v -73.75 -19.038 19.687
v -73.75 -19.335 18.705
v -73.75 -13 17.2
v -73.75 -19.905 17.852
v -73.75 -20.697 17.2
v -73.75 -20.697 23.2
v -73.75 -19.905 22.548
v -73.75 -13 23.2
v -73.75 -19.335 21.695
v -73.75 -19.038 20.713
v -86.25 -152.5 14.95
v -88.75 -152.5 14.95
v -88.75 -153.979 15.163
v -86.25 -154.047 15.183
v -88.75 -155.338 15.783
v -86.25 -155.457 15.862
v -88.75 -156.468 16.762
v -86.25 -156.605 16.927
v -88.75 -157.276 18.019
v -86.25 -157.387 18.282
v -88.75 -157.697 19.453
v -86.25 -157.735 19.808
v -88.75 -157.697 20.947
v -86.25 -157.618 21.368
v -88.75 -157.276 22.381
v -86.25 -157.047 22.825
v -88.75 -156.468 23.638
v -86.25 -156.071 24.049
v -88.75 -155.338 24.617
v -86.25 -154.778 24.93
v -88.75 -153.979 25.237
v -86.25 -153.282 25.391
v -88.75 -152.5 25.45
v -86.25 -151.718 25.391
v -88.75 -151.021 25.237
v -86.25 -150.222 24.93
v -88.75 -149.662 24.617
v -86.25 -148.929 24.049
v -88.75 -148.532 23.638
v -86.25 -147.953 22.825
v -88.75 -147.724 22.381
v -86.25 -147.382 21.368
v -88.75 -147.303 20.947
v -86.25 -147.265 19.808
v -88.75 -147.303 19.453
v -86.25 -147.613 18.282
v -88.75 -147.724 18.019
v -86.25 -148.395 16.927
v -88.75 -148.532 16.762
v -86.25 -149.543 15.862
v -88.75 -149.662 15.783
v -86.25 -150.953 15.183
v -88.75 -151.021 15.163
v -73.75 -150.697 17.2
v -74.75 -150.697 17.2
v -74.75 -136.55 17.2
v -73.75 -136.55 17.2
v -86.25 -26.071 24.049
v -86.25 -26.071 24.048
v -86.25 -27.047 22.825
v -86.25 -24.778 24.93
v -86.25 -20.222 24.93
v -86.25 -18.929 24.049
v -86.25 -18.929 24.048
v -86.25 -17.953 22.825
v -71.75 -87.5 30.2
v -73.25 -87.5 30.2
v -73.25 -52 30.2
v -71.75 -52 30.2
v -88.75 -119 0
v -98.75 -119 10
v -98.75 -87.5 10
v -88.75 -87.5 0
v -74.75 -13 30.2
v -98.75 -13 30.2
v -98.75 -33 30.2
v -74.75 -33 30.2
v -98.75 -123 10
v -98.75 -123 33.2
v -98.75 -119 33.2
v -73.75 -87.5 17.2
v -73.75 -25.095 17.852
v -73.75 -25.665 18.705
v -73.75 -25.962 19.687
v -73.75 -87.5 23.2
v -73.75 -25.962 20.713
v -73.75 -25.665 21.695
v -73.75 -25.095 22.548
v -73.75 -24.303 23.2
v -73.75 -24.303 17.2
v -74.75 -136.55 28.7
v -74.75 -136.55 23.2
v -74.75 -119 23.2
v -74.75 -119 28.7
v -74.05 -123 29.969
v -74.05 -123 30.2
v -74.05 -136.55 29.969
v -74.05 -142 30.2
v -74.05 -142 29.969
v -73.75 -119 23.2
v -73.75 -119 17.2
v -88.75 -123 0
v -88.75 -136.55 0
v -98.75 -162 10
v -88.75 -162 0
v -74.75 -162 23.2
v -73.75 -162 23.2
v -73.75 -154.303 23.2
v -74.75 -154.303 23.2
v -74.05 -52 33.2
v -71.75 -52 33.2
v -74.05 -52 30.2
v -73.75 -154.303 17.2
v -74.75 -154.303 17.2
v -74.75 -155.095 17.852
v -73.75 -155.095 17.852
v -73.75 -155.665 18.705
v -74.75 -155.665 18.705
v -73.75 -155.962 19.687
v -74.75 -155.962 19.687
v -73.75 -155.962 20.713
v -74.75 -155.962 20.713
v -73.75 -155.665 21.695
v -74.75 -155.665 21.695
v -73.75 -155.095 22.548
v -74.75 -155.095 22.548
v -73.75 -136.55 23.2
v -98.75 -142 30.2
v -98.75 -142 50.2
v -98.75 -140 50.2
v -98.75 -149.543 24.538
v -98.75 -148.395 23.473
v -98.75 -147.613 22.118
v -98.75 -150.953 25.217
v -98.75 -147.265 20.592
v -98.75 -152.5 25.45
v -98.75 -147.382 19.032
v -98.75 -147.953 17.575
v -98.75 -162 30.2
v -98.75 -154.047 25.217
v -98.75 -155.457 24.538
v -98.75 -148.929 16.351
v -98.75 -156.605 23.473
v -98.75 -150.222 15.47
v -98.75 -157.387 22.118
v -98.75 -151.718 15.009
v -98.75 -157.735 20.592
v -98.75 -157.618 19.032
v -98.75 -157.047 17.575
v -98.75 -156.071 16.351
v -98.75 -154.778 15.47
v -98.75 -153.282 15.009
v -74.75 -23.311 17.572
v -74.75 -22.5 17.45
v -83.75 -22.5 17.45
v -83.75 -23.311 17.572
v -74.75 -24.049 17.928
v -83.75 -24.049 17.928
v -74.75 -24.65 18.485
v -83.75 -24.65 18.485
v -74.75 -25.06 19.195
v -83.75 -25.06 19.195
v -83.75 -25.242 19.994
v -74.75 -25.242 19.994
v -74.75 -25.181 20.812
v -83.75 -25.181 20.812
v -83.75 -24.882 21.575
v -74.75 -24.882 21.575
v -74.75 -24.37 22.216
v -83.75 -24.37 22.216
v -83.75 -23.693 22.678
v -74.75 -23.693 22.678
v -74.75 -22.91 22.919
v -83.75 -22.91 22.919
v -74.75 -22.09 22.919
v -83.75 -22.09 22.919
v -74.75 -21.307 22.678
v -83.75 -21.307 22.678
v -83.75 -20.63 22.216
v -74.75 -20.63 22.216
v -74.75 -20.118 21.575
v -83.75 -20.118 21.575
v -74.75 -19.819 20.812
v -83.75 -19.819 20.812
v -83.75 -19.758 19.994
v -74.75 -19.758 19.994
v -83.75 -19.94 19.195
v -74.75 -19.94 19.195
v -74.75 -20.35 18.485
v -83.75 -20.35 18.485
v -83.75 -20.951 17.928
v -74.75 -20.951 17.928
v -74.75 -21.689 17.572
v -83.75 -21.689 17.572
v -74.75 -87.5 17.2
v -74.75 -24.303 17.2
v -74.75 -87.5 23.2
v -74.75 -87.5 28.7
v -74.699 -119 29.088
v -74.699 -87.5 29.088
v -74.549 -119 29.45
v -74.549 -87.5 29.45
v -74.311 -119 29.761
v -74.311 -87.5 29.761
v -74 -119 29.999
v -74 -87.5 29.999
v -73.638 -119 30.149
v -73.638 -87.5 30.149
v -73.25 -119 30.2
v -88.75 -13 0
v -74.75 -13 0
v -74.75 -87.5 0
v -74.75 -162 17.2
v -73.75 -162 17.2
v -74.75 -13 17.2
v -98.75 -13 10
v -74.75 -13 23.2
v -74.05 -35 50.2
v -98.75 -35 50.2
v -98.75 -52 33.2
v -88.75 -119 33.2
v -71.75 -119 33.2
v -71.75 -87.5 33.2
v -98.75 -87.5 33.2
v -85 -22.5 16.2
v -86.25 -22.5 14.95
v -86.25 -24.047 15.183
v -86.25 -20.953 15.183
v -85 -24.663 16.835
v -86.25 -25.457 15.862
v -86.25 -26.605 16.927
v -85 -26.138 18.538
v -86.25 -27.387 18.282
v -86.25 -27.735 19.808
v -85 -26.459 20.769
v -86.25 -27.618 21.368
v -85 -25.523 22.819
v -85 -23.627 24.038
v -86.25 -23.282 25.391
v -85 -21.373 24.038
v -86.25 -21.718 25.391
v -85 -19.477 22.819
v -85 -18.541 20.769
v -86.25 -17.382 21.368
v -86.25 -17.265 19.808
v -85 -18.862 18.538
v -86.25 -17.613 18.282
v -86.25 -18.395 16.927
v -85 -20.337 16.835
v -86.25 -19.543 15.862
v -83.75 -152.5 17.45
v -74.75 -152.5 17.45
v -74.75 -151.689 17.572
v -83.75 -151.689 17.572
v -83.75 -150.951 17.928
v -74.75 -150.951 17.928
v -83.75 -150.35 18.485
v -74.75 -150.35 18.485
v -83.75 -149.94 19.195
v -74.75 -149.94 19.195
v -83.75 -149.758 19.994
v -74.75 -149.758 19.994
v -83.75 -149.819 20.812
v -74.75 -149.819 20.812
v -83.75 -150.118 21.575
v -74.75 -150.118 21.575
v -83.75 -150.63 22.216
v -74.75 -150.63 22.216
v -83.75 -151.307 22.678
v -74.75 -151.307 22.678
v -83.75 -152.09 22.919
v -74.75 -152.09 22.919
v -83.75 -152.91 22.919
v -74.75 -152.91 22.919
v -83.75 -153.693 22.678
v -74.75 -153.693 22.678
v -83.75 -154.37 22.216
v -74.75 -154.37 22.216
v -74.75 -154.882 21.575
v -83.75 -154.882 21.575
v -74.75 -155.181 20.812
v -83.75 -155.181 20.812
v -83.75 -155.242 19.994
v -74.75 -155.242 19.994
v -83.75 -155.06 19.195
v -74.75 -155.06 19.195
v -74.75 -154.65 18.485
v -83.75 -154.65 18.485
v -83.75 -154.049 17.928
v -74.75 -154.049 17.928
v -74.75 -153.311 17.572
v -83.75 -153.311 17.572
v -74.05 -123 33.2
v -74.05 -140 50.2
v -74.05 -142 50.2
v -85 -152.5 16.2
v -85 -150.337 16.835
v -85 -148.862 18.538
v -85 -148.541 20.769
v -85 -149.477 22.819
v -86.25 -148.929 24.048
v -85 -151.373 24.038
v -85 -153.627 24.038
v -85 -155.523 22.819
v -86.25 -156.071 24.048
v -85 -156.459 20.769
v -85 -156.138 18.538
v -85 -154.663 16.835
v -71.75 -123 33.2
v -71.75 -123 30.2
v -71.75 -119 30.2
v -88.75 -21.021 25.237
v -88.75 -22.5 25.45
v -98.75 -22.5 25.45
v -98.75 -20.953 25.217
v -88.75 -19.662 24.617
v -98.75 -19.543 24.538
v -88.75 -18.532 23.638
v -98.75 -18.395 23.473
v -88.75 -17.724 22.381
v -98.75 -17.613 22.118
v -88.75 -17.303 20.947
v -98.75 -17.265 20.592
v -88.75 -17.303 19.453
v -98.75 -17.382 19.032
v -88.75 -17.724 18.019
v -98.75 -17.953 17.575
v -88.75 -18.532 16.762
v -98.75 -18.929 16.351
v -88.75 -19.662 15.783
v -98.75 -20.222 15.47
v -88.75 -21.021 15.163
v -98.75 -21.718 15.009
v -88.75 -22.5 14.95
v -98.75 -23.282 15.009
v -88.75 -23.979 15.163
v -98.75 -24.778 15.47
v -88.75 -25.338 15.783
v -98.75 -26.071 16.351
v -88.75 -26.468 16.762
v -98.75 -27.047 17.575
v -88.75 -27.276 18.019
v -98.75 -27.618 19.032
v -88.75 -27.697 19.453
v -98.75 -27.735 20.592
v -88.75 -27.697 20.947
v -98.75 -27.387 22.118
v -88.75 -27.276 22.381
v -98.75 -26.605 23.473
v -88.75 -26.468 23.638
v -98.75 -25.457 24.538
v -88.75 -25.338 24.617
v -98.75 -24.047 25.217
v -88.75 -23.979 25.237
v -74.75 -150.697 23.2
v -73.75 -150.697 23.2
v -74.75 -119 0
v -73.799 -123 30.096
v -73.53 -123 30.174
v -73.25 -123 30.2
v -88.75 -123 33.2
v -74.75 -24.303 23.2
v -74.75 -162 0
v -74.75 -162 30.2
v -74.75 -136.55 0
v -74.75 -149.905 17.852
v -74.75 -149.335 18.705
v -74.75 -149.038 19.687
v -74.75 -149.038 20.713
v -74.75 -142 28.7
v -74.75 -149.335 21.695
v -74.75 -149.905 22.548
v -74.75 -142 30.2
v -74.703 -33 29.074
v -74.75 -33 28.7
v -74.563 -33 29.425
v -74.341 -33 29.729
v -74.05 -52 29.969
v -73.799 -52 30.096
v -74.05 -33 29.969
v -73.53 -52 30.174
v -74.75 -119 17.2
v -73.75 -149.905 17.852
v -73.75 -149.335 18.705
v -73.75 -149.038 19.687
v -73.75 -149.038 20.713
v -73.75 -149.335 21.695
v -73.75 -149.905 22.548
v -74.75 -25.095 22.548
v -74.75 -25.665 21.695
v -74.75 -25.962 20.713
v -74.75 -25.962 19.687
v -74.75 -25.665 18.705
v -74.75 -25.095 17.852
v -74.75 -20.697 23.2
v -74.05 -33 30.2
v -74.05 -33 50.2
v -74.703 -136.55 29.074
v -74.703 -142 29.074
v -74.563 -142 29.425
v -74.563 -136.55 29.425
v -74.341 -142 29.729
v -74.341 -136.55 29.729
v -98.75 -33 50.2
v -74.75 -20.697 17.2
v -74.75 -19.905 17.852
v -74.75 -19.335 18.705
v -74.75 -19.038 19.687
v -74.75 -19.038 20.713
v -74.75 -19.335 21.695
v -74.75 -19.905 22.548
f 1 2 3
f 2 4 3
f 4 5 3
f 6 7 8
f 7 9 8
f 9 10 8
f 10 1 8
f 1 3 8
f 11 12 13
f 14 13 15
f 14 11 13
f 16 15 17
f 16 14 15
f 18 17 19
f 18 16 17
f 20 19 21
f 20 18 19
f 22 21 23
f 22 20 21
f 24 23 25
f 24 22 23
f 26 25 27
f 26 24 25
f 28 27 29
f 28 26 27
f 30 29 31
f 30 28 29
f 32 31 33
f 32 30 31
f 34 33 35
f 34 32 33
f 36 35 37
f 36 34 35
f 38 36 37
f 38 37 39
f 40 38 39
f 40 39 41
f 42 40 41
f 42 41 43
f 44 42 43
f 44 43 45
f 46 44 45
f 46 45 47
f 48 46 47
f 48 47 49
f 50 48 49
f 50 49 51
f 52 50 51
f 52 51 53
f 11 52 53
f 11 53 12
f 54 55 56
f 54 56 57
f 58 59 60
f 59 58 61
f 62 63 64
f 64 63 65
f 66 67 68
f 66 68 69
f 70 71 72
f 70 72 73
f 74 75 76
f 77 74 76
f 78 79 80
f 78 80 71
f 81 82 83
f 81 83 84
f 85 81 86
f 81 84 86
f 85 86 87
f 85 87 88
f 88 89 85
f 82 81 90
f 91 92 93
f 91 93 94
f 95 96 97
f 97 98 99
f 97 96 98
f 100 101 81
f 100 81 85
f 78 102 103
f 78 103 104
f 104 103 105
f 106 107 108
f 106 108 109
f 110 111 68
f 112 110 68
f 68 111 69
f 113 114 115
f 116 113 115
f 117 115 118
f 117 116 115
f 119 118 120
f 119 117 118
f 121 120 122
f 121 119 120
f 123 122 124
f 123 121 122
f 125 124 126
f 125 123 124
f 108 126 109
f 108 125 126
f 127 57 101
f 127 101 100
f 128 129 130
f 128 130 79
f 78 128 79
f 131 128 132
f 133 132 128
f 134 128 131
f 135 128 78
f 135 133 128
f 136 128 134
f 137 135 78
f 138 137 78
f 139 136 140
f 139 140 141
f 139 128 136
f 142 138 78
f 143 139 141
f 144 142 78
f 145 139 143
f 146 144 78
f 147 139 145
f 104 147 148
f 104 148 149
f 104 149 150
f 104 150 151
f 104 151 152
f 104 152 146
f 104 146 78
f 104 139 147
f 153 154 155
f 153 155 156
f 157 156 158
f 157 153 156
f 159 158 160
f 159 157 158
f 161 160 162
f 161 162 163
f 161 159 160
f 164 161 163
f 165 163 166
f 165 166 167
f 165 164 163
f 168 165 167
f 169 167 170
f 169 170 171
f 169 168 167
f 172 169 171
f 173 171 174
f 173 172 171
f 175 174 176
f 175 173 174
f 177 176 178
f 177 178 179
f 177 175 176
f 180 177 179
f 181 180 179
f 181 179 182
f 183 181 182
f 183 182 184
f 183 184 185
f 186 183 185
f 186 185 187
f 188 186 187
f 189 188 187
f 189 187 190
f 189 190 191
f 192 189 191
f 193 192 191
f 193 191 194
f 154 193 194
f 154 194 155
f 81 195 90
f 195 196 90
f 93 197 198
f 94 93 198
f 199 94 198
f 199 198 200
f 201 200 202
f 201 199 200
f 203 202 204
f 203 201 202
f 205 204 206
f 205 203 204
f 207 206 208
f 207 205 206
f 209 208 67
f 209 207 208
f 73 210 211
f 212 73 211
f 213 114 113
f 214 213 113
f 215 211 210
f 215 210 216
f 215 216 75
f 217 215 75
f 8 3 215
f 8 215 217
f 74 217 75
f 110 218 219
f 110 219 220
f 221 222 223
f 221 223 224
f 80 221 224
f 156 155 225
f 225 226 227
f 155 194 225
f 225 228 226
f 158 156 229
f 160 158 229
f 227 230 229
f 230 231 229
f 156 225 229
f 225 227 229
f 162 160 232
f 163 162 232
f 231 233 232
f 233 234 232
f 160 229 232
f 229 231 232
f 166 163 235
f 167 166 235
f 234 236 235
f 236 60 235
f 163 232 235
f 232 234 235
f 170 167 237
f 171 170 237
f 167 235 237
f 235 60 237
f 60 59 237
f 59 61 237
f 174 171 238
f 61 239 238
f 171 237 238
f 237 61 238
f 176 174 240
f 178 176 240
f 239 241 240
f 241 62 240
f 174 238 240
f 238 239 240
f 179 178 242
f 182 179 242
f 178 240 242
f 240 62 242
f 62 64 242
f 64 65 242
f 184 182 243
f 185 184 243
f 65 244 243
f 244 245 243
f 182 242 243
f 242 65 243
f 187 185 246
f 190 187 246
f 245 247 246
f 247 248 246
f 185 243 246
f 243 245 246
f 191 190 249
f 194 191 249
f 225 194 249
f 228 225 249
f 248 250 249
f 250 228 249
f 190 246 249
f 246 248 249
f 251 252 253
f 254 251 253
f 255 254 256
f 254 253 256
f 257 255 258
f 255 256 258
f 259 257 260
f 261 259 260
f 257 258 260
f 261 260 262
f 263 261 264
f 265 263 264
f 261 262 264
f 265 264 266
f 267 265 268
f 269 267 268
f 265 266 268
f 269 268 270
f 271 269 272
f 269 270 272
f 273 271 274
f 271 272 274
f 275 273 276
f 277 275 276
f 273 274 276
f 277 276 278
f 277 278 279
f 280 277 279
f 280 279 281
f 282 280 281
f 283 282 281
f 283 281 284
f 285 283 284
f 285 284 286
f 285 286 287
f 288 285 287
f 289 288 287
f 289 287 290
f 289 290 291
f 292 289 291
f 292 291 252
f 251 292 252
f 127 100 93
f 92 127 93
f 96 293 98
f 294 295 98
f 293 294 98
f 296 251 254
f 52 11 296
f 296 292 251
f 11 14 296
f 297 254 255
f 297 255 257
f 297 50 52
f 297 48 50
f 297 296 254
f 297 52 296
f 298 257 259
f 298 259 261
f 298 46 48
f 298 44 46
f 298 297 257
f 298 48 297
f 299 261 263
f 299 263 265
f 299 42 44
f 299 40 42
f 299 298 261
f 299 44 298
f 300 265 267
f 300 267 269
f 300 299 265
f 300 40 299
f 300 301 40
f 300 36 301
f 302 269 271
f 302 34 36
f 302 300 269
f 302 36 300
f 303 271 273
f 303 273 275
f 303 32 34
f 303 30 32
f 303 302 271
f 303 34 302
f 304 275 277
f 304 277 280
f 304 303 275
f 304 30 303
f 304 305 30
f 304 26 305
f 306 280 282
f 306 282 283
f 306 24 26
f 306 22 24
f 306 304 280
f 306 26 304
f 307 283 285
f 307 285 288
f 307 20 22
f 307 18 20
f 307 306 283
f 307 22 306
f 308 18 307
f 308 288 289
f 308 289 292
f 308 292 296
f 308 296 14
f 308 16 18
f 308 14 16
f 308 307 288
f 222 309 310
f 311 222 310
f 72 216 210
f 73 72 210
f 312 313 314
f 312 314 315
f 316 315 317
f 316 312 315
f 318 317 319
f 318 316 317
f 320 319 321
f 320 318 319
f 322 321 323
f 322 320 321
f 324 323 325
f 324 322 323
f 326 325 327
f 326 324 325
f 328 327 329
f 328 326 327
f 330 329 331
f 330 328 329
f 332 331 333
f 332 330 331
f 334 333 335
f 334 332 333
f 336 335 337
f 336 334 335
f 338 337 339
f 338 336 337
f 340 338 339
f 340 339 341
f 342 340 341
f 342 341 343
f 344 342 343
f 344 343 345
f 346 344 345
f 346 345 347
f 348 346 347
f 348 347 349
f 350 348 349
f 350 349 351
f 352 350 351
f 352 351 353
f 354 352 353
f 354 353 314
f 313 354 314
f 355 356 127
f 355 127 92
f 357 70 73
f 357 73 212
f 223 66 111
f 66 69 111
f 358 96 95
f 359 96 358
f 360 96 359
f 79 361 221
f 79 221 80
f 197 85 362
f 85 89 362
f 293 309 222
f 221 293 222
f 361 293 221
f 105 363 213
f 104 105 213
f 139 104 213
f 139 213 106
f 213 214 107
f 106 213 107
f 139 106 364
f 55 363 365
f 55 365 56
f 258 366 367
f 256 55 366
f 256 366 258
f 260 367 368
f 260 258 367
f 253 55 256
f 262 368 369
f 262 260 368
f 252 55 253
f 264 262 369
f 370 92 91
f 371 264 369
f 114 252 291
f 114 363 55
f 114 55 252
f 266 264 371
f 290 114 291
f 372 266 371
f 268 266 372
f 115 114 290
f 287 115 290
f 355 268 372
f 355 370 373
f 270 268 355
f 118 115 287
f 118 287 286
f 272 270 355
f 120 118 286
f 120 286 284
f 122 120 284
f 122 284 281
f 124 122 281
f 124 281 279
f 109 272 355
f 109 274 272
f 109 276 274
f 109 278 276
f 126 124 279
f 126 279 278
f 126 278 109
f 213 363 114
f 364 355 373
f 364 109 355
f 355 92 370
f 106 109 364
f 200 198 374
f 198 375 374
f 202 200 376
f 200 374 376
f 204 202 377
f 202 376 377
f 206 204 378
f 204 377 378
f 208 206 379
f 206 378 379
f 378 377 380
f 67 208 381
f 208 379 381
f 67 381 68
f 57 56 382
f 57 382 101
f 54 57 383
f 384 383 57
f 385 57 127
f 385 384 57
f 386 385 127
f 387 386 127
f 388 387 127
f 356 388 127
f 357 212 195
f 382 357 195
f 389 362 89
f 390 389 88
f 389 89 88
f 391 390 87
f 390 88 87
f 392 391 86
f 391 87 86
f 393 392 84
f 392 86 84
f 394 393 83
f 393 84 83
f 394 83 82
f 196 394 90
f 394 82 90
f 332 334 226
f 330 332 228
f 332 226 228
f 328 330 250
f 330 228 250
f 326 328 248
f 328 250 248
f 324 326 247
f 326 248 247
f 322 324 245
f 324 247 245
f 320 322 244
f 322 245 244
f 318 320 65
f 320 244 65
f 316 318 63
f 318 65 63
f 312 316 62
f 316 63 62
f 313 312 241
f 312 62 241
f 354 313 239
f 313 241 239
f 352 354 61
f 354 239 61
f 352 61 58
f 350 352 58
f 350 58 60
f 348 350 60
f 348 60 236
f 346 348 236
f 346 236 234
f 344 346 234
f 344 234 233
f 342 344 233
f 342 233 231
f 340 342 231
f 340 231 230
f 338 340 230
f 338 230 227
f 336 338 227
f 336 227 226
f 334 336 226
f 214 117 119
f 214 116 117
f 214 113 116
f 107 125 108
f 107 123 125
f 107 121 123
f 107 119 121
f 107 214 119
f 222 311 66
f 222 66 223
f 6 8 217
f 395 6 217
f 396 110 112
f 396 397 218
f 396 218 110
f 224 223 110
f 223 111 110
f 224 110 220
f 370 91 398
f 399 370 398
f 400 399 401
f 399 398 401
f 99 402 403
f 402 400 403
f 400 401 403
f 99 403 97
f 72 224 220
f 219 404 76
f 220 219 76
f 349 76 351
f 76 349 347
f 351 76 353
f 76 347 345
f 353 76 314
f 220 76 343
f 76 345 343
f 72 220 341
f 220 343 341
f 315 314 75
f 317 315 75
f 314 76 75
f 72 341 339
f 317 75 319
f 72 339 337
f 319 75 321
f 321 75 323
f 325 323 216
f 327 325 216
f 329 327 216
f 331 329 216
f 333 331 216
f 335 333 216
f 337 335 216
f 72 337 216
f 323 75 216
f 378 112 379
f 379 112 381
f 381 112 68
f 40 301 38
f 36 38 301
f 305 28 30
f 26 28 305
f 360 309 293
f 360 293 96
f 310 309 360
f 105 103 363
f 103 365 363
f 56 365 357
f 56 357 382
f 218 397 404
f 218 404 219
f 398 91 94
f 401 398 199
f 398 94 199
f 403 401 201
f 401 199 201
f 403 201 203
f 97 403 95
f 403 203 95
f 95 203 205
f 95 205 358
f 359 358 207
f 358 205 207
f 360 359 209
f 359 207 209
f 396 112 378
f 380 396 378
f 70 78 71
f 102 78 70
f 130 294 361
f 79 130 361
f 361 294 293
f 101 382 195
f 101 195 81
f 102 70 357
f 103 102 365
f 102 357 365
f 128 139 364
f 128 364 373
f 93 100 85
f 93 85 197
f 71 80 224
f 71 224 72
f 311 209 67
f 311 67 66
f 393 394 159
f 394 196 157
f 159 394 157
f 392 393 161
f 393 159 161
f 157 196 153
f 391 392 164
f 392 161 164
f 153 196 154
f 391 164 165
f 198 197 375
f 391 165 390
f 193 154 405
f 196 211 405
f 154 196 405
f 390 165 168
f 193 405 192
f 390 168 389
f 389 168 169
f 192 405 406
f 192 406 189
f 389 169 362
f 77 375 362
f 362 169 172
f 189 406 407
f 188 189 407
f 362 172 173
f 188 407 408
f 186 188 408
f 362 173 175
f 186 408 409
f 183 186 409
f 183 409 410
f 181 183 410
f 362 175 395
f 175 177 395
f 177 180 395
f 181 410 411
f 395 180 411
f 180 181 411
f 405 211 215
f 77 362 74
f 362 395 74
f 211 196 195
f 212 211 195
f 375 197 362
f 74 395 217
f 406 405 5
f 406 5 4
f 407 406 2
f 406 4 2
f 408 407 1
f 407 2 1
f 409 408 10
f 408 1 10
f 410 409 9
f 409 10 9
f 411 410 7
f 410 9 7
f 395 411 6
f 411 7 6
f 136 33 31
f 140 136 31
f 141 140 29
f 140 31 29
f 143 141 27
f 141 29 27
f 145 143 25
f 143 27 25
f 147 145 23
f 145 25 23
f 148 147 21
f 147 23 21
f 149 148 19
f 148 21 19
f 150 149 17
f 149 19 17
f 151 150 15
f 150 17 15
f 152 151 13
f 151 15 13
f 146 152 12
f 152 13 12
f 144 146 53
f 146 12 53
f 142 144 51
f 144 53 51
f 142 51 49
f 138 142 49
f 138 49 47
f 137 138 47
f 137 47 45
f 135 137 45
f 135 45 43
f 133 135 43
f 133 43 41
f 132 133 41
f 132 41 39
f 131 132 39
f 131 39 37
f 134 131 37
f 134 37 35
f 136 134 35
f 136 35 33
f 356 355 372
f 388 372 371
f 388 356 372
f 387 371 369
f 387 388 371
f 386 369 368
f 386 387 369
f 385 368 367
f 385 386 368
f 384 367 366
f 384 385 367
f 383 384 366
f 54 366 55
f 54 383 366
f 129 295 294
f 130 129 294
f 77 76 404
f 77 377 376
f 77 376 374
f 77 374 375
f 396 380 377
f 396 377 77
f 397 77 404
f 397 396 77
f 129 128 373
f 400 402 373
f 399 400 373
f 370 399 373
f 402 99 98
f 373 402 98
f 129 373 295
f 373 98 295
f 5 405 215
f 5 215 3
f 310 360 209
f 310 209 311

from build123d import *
from build123d.topology import SkipClean

# Parameters (mm, degrees)
BOSS_EXTRUDE1_DEPTH            = 7.2
SKETCH2_R                      = 1.1
CUT_EXTRUDE1_DEPTH             = 99.880748885
SKETCH3_R                      = 2.25
CUT_EXTRUDE2_DEPTH             = 5.5
BOSS_EXTRUDE2_DEPTH            = 3
FILLET1_R                      = 11
BOSS_EXTRUDE3_DEPTH            = 43
BOSS_EXTRUDE4_DEPTH            = 30
FILLET2_R                      = 1.5
SKETCH7_R                      = 2.75
CUT_EXTRUDE3_DEPTH             = 179.693144804
SKETCH8_R                      = 5.25
CUT_EXTRUDE4_DEPTH             = 5
CUT_EXTRUDE6_START             = -2.5
SKETCH10_R                     = 5.25
CUT_EXTRUDE6_DEPTH             = 2.5
CHAMFER1_SIZE                  = 2.5
CUT_EXTRUDE5_REACH             = 170.548
SKETCH9_R                      = 3.5
CUT_EXTRUDE5_DIRECTION_2_REACH = 170.548
CUT_EXTRUDE7_DEPTH             = 105.056727317
CUT_EXTRUDE8_DEPTH             = 20
BOSS_EXTRUDE6_DEPTH            = 17
SKETCH15_R                     = 5.25
BOSS_EXTRUDE7_DEPTH            = 10
CHAMFER3_SIZE                  = 10
BOSS_EXTRUDE5_DEPTH            = 17.55
SKETCH16_W                     = 1.5
SKETCH16_H                     = 19
CUT_EXTRUDE9_DEPTH             = 2.3
BOSS_EXTRUDE8_DEPTH            = 4
BOSS_EXTRUDE9_DEPTH            = 31.5


with BuildPart() as part:
    # Sketch1 → Boss-Extrude1 (new body)
    with BuildSketch(Plane.XY):
        Polygon((74.75, 0), (-74.75, 0), (-74.75, 30), (-88.75, 30), (-88.75, -13), (84.25, -13), (84.25, 17), (74.75, 17), align=None)
    extrude(amount=BOSS_EXTRUDE1_DEPTH)

    # Sketch2 → Cut-Extrude1 (cut, through all)
    with BuildSketch(Plane.XZ.offset(13)):
        with Locations(Location((-56.25, 4.5, 0), (0, 0, 270))):
            Circle(SKETCH2_R)
        with Locations(Location((37.75, 4.5, 0), (0, 0, 270))):
            Circle(SKETCH2_R)
    extrude(amount=-CUT_EXTRUDE1_DEPTH, mode=Mode.SUBTRACT)

    # Sketch3 → Cut-Extrude2 (cut)
    with BuildSketch(Plane.XZ.offset(13)):
        with Locations(Location((-56.25, 4.5, 0), (0, 0, 270))):
            Circle(SKETCH3_R)
        with Locations(Location((37.75, 4.5, 0), (0, 0, 270))):
            Circle(SKETCH3_R)
    extrude(amount=-CUT_EXTRUDE2_DEPTH, mode=Mode.SUBTRACT)

    # Sketch4 → Boss-Extrude2 (add)
    with BuildSketch(Plane.XY.offset(7.2)):
        Polygon((-88.75, -13), (84.25, -13), (84.25, 2.989373151), (84.25, 17), (74.75, 17), (74.75, 6), (-74.75, 6), (-74.75, 30), (-88.75, 30), align=None)
    extrude(amount=BOSS_EXTRUDE2_DEPTH)

    # Fillet1
    fillet1_edges = [part.edges().sort_by_distance(p)[0] for p in [
        (74.75, 6, 8.7),
        (-74.75, 6, 8.7),
    ]]
    fillet(fillet1_edges, radius=FILLET1_R - 0.0001)  # a hair under: the kernel refuses the full size

    # Sketch5 → Boss-Extrude3 (add)
    with BuildSketch(Plane.XZ.offset(13)):
        Polygon((-74.75, 30.2), (-71.75, 30.2), (-71.75, 33.2), (-88.75, 33.2), (-88.75, 10.2), (-74.75, 10.2), (-74.75, 17.2), (-73.75, 17.2), (-73.75, 23.2), (-74.75, 23.2), align=None)
    extrude(amount=-BOSS_EXTRUDE3_DEPTH)

    # Sketch6 → Boss-Extrude4 (add)
    with BuildSketch(Plane.XZ.offset(13)):
        Polygon((74.75, 10.2), (74.75, 17.2), (73.75, 17.2), (73.75, 23.2), (74.75, 23.2), (74.75, 30.2), (71.75, 30.2), (71.75, 33.2), (84.25, 33.2), (84.25, 10.2), align=None)
    extrude(amount=-BOSS_EXTRUDE4_DEPTH)

    # Fillet2
    fillet2_edges = [part.edges().sort_by_distance(p)[0] for p in [
        (74.75, 1.99995, 10.2),
        (74.75, 2, 30.2),
        (-74.75, 1.99995, 10.2),
        (-74.75, 8.5, 30.2),
    ]]
    fillet(fillet2_edges, radius=FILLET2_R)

    # Sketch7 → Cut-Extrude3 (cut, through all)
    with BuildSketch(Plane(origin=(84.25, 0, 0), x_dir=(0, 0, -1), z_dir=(1, 0, 0))):
        with Locations((-20.2, -3.5)):
            Circle(SKETCH7_R)
    extrude(amount=-CUT_EXTRUDE3_DEPTH, mode=Mode.SUBTRACT)

    # Sketch8 → Cut-Extrude4 (cut)
    with BuildSketch(Plane(origin=(84.25, 0, 0), x_dir=(0, 0, -1), z_dir=(1, 0, 0))):
        with Locations((-20.2, -3.5)):
            Circle(SKETCH8_R)
    extrude(amount=-CUT_EXTRUDE4_DEPTH, mode=Mode.SUBTRACT)

    # Sketch10 → Cut-Extrude6 (cut)
    with BuildSketch(Plane.ZY.offset(88.75).offset(CUT_EXTRUDE6_START)):
        with Locations(Location((20.2, -3.5, 0), (0, 0, 180))):
            Circle(SKETCH10_R)
    extrude(amount=CUT_EXTRUDE6_DEPTH, mode=Mode.SUBTRACT)

    # Chamfer1
    chamfer1_edges = [part.edges().sort_by_distance(p)[0] for p in [
        (79.25, -3.5, 22.95),
        (-86.25, -3.5, 22.95),
    ]]
    chamfer(chamfer1_edges, length=CHAMFER1_SIZE - 0.0001)  # a hair under: the kernel refuses the full size

    # Cut-Extrude5: up to this face of the body (flat: up to its plane)
    cut_extrude5_end = Plane(part.part.faces().sort_by_distance((74.75, 2, 25.95))[0])
    # Sketch9 → Cut-Extrude5 (cut, up to the picked face)
    with BuildSketch(Plane.ZY.offset(-73.75), mode=Mode.PRIVATE) as cut_extrude5_sk1:
        with Locations((20.2, -3.5)):
            Circle(SKETCH9_R)
    cut_extrude5_tool1 = split(extrude(cut_extrude5_sk1.sketch, amount=-CUT_EXTRUDE5_REACH, mode=Mode.PRIVATE), bisect_by=cut_extrude5_end, keep=Keep.BOTH, mode=Mode.PRIVATE)
    add(cut_extrude5_tool1.solids().sort_by(Axis((73.75, -3.5, 20.2), (1, 0, 0)))[0], mode=Mode.SUBTRACT)

    # Cut-Extrude5 direction 2: up to this face of the body (flat: up to its plane)
    cut_extrude5_direction_2_end = Plane(part.part.faces().sort_by_distance((-74.75, 8.5, 25.95))[0])
    # Sketch9 → Cut-Extrude5 direction 2 (cut, up to the picked face)
    with BuildSketch(Plane.ZY.offset(-73.75), mode=Mode.PRIVATE) as cut_extrude5_direction_2_sk1:
        with Locations((20.2, -3.5)):
            Circle(SKETCH9_R)
    cut_extrude5_direction_2_tool1 = split(extrude(cut_extrude5_direction_2_sk1.sketch, amount=CUT_EXTRUDE5_DIRECTION_2_REACH, mode=Mode.PRIVATE), bisect_by=cut_extrude5_direction_2_end, keep=Keep.BOTH, mode=Mode.PRIVATE)
    add(cut_extrude5_direction_2_tool1.solids().sort_by(Axis((73.75, -3.5, 20.2), (-1, 0, 0)))[0], mode=Mode.SUBTRACT)


with BuildPart() as body_2:
    # Mirror1: mirrored copy
    add(part.part.mirror(Plane(origin=(-88.75, -13, 7.2), x_dir=(0, 0, 1), z_dir=(0, 1, 0))))

    # Sketch11 → Cut-Extrude7 (cut, through all)
    with BuildSketch(Plane(origin=(0, -13, 0), x_dir=(1, 0, 0), z_dir=(0, 1, 0))):
        Polygon((71.75, -33.2), (71.75, -17.2), (-74.75, -17.2), (-74.75, 0), (71.75, 0), (84.25, 0), (84.25, -33.2), align=None)
    extrude(amount=-CUT_EXTRUDE7_DEPTH, mode=Mode.SUBTRACT)

    # Sketch13 → Cut-Extrude8 (cut)
    with BuildSketch(Plane(origin=(0, -13, 0), x_dir=(1, 0, 0), z_dir=(0, 1, 0))):
        Polygon((-88.75, -30.2), (-74.75, -30.2), (-74.75, -28.7), (-71.75, -28.7), (-71.75, -30.2), (-71.75, -33.2), (-88.75, -33.2), align=None)
    extrude(amount=-CUT_EXTRUDE8_DEPTH, mode=Mode.SUBTRACT)

    # Sketch14 → Boss-Extrude6 (add)
    with BuildSketch(Plane.ZY.offset(88.75)):
        Polygon((33.2, -33), (50.2, -33), (50.2, -35), (35.2, -50), (33.2, -52), (33.2, -50), align=None)
    extrude(amount=-BOSS_EXTRUDE6_DEPTH)

    # Sketch15 → Boss-Extrude7 (add)
    with SkipClean():  # the faces are left unmerged after this step: merging them gives an invalid solid
        with BuildSketch(Plane.ZY.offset(88.75)):
            Polygon((33.2, -52), (0, -52), (0, -13), (30.2, -13), (30.2, -33), (50.2, -33), (50.2, -35), align=None)
            with Locations((20.2, -22.5)):
                Circle(SKETCH15_R, mode=Mode.SUBTRACT)
        extrude(amount=BOSS_EXTRUDE7_DEPTH)
    add(body_2.part.scale(1), mode=Mode.REPLACE)  # the faces are merged on a copy

    # Chamfer3
    chamfer3_edges = [body_2.edges().sort_by_distance(p)[0] for p in [
        (-98.75, -32.5, 0),
    ]]
    chamfer(chamfer3_edges, length=CHAMFER3_SIZE)

    # Sketch12 → Boss-Extrude5 (add)
    with SkipClean():  # the faces are left unmerged after this step: merging them gives an invalid solid
        with BuildSketch(Plane.XZ.offset(56)):
            with BuildLine():
                Line((-88.75, 0), (-74.75, 0))
                Line((-74.75, 0), (-74.75, 17.2))
                Line((-74.75, 17.2), (-73.75, 17.2))
                Line((-73.75, 17.2), (-73.75, 23.2))
                Line((-73.75, 23.2), (-74.75, 23.2))
                Line((-74.75, 23.2), (-74.75, 28.7))
                ThreePointArc((-74.75, 28.7), (-74.310660172, 29.760660172), (-73.25, 30.2))
                Line((-73.25, 30.2), (-71.75, 30.2))
                Line((-71.75, 30.2), (-71.75, 33.2))
                Line((-71.75, 33.2), (-88.75, 33.2))
                Line((-88.75, 33.2), (-88.75, 0))
            make_face()
        extrude(amount=-BOSS_EXTRUDE5_DEPTH)

    # Sketch16 → Cut-Extrude9 (cut)
    with SkipClean():  # the faces are left unmerged after this step: merging them gives an invalid solid
        with BuildSketch(Plane(origin=(-71.75, 0, 0), x_dir=(0, 0, -1), z_dir=(1, 0, 0))):
            Polygon((-33.2, -52), (-30.2, -52), (-30.2, -33), (-50.2, -33), (-50.2, -35), align=None)
            with Locations((-29.45, -42.5)):
                Rectangle(SKETCH16_W, SKETCH16_H)
        extrude(amount=-CUT_EXTRUDE9_DEPTH, mode=Mode.SUBTRACT)

    # Sketch18 → Boss-Extrude8 (add)
    with SkipClean():  # the faces are left unmerged after this step: merging them gives an invalid solid
        with BuildSketch(Plane.XZ.offset(52)):
            Polygon((-98.75, 33.2), (-98.75, 10), (-88.75, 0), (-88.75, 33.2), align=None)
        extrude(amount=BOSS_EXTRUDE8_DEPTH)

    # Sketch19 → Boss-Extrude9 (add)
    with SkipClean():  # the faces are left unmerged after this step: merging them gives an invalid solid
        with BuildSketch(Plane.XZ.offset(56)):
            with BuildLine():
                Line((-88.75, 0), (-74.75, 0))
                Line((-74.75, 0), (-74.75, 17.2))
                Line((-74.75, 17.2), (-73.75, 17.2))
                Line((-73.75, 17.2), (-73.75, 23.2))
                Line((-73.75, 23.2), (-74.75, 23.2))
                Line((-74.75, 23.2), (-74.75, 28.7))
                ThreePointArc((-74.75, 28.7), (-74.310660172, 29.760660172), (-73.25, 30.2))
                Line((-73.25, 30.2), (-71.75, 30.2))
                Line((-71.75, 30.2), (-71.75, 33.2))
                Line((-71.75, 33.2), (-98.75, 33.2))
                Line((-98.75, 33.2), (-98.75, 10))
                Line((-98.75, 10), (-88.75, 0))
            make_face()
        extrude(amount=BOSS_EXTRUDE9_DEPTH)

    # Mirror2: body 2 across plane


with BuildPart() as body_2_1:
    with SkipClean():  # the faces are left unmerged after this step: merging them gives an invalid solid
        add(body_2.part)
        add(body_2.part.mirror(Plane.ZX.offset(-87.5)))


solid = body_2_1.part
